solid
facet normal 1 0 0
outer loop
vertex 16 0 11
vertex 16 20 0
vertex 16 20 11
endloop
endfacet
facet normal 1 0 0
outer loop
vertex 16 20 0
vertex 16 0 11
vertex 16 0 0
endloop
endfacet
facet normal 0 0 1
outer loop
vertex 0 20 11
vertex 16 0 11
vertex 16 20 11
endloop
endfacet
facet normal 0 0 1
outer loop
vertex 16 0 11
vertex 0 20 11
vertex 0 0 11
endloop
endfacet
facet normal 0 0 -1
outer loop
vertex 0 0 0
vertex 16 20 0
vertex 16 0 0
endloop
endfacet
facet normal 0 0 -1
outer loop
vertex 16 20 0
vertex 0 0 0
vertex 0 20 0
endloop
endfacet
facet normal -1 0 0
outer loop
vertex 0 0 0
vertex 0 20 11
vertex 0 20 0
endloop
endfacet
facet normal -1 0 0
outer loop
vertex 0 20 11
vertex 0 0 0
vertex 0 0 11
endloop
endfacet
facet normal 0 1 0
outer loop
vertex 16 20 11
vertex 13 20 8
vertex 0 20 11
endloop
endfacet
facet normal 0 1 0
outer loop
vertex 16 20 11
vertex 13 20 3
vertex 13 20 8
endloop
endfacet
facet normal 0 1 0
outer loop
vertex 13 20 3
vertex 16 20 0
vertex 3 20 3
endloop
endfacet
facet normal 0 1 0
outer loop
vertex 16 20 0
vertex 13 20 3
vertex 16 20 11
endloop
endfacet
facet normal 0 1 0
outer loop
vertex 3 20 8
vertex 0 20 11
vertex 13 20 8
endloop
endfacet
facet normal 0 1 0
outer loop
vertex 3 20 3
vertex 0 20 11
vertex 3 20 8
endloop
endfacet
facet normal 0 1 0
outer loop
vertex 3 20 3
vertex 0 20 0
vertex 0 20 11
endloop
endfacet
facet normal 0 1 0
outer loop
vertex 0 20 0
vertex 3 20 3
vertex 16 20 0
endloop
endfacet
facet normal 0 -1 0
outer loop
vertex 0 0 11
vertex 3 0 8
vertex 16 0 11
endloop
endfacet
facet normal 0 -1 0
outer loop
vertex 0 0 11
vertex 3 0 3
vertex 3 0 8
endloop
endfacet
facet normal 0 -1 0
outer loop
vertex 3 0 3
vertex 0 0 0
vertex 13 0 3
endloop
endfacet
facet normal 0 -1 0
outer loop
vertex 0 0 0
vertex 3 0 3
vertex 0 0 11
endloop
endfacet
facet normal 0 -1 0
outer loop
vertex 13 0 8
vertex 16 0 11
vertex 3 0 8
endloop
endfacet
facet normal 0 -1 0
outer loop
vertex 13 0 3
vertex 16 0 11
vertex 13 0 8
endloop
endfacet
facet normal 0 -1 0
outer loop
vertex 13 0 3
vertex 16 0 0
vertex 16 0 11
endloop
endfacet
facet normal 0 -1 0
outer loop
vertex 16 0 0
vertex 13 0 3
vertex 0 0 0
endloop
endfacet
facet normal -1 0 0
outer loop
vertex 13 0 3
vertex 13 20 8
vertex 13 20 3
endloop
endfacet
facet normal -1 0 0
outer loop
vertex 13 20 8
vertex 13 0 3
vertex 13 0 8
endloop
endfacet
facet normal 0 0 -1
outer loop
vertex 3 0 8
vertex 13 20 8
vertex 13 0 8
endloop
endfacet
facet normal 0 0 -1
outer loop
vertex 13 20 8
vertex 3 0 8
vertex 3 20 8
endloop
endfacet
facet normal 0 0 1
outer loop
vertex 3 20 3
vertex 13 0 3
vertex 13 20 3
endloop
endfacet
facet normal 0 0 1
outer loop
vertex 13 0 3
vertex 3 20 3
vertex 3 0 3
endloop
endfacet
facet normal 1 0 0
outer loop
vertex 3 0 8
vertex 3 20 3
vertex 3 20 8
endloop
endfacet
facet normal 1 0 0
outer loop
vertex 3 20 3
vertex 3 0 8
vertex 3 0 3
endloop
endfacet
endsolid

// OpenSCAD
difference()
{
    cube([16,20,11]);
    translate([3,-5,3]) cube([10,30,5]);
}
